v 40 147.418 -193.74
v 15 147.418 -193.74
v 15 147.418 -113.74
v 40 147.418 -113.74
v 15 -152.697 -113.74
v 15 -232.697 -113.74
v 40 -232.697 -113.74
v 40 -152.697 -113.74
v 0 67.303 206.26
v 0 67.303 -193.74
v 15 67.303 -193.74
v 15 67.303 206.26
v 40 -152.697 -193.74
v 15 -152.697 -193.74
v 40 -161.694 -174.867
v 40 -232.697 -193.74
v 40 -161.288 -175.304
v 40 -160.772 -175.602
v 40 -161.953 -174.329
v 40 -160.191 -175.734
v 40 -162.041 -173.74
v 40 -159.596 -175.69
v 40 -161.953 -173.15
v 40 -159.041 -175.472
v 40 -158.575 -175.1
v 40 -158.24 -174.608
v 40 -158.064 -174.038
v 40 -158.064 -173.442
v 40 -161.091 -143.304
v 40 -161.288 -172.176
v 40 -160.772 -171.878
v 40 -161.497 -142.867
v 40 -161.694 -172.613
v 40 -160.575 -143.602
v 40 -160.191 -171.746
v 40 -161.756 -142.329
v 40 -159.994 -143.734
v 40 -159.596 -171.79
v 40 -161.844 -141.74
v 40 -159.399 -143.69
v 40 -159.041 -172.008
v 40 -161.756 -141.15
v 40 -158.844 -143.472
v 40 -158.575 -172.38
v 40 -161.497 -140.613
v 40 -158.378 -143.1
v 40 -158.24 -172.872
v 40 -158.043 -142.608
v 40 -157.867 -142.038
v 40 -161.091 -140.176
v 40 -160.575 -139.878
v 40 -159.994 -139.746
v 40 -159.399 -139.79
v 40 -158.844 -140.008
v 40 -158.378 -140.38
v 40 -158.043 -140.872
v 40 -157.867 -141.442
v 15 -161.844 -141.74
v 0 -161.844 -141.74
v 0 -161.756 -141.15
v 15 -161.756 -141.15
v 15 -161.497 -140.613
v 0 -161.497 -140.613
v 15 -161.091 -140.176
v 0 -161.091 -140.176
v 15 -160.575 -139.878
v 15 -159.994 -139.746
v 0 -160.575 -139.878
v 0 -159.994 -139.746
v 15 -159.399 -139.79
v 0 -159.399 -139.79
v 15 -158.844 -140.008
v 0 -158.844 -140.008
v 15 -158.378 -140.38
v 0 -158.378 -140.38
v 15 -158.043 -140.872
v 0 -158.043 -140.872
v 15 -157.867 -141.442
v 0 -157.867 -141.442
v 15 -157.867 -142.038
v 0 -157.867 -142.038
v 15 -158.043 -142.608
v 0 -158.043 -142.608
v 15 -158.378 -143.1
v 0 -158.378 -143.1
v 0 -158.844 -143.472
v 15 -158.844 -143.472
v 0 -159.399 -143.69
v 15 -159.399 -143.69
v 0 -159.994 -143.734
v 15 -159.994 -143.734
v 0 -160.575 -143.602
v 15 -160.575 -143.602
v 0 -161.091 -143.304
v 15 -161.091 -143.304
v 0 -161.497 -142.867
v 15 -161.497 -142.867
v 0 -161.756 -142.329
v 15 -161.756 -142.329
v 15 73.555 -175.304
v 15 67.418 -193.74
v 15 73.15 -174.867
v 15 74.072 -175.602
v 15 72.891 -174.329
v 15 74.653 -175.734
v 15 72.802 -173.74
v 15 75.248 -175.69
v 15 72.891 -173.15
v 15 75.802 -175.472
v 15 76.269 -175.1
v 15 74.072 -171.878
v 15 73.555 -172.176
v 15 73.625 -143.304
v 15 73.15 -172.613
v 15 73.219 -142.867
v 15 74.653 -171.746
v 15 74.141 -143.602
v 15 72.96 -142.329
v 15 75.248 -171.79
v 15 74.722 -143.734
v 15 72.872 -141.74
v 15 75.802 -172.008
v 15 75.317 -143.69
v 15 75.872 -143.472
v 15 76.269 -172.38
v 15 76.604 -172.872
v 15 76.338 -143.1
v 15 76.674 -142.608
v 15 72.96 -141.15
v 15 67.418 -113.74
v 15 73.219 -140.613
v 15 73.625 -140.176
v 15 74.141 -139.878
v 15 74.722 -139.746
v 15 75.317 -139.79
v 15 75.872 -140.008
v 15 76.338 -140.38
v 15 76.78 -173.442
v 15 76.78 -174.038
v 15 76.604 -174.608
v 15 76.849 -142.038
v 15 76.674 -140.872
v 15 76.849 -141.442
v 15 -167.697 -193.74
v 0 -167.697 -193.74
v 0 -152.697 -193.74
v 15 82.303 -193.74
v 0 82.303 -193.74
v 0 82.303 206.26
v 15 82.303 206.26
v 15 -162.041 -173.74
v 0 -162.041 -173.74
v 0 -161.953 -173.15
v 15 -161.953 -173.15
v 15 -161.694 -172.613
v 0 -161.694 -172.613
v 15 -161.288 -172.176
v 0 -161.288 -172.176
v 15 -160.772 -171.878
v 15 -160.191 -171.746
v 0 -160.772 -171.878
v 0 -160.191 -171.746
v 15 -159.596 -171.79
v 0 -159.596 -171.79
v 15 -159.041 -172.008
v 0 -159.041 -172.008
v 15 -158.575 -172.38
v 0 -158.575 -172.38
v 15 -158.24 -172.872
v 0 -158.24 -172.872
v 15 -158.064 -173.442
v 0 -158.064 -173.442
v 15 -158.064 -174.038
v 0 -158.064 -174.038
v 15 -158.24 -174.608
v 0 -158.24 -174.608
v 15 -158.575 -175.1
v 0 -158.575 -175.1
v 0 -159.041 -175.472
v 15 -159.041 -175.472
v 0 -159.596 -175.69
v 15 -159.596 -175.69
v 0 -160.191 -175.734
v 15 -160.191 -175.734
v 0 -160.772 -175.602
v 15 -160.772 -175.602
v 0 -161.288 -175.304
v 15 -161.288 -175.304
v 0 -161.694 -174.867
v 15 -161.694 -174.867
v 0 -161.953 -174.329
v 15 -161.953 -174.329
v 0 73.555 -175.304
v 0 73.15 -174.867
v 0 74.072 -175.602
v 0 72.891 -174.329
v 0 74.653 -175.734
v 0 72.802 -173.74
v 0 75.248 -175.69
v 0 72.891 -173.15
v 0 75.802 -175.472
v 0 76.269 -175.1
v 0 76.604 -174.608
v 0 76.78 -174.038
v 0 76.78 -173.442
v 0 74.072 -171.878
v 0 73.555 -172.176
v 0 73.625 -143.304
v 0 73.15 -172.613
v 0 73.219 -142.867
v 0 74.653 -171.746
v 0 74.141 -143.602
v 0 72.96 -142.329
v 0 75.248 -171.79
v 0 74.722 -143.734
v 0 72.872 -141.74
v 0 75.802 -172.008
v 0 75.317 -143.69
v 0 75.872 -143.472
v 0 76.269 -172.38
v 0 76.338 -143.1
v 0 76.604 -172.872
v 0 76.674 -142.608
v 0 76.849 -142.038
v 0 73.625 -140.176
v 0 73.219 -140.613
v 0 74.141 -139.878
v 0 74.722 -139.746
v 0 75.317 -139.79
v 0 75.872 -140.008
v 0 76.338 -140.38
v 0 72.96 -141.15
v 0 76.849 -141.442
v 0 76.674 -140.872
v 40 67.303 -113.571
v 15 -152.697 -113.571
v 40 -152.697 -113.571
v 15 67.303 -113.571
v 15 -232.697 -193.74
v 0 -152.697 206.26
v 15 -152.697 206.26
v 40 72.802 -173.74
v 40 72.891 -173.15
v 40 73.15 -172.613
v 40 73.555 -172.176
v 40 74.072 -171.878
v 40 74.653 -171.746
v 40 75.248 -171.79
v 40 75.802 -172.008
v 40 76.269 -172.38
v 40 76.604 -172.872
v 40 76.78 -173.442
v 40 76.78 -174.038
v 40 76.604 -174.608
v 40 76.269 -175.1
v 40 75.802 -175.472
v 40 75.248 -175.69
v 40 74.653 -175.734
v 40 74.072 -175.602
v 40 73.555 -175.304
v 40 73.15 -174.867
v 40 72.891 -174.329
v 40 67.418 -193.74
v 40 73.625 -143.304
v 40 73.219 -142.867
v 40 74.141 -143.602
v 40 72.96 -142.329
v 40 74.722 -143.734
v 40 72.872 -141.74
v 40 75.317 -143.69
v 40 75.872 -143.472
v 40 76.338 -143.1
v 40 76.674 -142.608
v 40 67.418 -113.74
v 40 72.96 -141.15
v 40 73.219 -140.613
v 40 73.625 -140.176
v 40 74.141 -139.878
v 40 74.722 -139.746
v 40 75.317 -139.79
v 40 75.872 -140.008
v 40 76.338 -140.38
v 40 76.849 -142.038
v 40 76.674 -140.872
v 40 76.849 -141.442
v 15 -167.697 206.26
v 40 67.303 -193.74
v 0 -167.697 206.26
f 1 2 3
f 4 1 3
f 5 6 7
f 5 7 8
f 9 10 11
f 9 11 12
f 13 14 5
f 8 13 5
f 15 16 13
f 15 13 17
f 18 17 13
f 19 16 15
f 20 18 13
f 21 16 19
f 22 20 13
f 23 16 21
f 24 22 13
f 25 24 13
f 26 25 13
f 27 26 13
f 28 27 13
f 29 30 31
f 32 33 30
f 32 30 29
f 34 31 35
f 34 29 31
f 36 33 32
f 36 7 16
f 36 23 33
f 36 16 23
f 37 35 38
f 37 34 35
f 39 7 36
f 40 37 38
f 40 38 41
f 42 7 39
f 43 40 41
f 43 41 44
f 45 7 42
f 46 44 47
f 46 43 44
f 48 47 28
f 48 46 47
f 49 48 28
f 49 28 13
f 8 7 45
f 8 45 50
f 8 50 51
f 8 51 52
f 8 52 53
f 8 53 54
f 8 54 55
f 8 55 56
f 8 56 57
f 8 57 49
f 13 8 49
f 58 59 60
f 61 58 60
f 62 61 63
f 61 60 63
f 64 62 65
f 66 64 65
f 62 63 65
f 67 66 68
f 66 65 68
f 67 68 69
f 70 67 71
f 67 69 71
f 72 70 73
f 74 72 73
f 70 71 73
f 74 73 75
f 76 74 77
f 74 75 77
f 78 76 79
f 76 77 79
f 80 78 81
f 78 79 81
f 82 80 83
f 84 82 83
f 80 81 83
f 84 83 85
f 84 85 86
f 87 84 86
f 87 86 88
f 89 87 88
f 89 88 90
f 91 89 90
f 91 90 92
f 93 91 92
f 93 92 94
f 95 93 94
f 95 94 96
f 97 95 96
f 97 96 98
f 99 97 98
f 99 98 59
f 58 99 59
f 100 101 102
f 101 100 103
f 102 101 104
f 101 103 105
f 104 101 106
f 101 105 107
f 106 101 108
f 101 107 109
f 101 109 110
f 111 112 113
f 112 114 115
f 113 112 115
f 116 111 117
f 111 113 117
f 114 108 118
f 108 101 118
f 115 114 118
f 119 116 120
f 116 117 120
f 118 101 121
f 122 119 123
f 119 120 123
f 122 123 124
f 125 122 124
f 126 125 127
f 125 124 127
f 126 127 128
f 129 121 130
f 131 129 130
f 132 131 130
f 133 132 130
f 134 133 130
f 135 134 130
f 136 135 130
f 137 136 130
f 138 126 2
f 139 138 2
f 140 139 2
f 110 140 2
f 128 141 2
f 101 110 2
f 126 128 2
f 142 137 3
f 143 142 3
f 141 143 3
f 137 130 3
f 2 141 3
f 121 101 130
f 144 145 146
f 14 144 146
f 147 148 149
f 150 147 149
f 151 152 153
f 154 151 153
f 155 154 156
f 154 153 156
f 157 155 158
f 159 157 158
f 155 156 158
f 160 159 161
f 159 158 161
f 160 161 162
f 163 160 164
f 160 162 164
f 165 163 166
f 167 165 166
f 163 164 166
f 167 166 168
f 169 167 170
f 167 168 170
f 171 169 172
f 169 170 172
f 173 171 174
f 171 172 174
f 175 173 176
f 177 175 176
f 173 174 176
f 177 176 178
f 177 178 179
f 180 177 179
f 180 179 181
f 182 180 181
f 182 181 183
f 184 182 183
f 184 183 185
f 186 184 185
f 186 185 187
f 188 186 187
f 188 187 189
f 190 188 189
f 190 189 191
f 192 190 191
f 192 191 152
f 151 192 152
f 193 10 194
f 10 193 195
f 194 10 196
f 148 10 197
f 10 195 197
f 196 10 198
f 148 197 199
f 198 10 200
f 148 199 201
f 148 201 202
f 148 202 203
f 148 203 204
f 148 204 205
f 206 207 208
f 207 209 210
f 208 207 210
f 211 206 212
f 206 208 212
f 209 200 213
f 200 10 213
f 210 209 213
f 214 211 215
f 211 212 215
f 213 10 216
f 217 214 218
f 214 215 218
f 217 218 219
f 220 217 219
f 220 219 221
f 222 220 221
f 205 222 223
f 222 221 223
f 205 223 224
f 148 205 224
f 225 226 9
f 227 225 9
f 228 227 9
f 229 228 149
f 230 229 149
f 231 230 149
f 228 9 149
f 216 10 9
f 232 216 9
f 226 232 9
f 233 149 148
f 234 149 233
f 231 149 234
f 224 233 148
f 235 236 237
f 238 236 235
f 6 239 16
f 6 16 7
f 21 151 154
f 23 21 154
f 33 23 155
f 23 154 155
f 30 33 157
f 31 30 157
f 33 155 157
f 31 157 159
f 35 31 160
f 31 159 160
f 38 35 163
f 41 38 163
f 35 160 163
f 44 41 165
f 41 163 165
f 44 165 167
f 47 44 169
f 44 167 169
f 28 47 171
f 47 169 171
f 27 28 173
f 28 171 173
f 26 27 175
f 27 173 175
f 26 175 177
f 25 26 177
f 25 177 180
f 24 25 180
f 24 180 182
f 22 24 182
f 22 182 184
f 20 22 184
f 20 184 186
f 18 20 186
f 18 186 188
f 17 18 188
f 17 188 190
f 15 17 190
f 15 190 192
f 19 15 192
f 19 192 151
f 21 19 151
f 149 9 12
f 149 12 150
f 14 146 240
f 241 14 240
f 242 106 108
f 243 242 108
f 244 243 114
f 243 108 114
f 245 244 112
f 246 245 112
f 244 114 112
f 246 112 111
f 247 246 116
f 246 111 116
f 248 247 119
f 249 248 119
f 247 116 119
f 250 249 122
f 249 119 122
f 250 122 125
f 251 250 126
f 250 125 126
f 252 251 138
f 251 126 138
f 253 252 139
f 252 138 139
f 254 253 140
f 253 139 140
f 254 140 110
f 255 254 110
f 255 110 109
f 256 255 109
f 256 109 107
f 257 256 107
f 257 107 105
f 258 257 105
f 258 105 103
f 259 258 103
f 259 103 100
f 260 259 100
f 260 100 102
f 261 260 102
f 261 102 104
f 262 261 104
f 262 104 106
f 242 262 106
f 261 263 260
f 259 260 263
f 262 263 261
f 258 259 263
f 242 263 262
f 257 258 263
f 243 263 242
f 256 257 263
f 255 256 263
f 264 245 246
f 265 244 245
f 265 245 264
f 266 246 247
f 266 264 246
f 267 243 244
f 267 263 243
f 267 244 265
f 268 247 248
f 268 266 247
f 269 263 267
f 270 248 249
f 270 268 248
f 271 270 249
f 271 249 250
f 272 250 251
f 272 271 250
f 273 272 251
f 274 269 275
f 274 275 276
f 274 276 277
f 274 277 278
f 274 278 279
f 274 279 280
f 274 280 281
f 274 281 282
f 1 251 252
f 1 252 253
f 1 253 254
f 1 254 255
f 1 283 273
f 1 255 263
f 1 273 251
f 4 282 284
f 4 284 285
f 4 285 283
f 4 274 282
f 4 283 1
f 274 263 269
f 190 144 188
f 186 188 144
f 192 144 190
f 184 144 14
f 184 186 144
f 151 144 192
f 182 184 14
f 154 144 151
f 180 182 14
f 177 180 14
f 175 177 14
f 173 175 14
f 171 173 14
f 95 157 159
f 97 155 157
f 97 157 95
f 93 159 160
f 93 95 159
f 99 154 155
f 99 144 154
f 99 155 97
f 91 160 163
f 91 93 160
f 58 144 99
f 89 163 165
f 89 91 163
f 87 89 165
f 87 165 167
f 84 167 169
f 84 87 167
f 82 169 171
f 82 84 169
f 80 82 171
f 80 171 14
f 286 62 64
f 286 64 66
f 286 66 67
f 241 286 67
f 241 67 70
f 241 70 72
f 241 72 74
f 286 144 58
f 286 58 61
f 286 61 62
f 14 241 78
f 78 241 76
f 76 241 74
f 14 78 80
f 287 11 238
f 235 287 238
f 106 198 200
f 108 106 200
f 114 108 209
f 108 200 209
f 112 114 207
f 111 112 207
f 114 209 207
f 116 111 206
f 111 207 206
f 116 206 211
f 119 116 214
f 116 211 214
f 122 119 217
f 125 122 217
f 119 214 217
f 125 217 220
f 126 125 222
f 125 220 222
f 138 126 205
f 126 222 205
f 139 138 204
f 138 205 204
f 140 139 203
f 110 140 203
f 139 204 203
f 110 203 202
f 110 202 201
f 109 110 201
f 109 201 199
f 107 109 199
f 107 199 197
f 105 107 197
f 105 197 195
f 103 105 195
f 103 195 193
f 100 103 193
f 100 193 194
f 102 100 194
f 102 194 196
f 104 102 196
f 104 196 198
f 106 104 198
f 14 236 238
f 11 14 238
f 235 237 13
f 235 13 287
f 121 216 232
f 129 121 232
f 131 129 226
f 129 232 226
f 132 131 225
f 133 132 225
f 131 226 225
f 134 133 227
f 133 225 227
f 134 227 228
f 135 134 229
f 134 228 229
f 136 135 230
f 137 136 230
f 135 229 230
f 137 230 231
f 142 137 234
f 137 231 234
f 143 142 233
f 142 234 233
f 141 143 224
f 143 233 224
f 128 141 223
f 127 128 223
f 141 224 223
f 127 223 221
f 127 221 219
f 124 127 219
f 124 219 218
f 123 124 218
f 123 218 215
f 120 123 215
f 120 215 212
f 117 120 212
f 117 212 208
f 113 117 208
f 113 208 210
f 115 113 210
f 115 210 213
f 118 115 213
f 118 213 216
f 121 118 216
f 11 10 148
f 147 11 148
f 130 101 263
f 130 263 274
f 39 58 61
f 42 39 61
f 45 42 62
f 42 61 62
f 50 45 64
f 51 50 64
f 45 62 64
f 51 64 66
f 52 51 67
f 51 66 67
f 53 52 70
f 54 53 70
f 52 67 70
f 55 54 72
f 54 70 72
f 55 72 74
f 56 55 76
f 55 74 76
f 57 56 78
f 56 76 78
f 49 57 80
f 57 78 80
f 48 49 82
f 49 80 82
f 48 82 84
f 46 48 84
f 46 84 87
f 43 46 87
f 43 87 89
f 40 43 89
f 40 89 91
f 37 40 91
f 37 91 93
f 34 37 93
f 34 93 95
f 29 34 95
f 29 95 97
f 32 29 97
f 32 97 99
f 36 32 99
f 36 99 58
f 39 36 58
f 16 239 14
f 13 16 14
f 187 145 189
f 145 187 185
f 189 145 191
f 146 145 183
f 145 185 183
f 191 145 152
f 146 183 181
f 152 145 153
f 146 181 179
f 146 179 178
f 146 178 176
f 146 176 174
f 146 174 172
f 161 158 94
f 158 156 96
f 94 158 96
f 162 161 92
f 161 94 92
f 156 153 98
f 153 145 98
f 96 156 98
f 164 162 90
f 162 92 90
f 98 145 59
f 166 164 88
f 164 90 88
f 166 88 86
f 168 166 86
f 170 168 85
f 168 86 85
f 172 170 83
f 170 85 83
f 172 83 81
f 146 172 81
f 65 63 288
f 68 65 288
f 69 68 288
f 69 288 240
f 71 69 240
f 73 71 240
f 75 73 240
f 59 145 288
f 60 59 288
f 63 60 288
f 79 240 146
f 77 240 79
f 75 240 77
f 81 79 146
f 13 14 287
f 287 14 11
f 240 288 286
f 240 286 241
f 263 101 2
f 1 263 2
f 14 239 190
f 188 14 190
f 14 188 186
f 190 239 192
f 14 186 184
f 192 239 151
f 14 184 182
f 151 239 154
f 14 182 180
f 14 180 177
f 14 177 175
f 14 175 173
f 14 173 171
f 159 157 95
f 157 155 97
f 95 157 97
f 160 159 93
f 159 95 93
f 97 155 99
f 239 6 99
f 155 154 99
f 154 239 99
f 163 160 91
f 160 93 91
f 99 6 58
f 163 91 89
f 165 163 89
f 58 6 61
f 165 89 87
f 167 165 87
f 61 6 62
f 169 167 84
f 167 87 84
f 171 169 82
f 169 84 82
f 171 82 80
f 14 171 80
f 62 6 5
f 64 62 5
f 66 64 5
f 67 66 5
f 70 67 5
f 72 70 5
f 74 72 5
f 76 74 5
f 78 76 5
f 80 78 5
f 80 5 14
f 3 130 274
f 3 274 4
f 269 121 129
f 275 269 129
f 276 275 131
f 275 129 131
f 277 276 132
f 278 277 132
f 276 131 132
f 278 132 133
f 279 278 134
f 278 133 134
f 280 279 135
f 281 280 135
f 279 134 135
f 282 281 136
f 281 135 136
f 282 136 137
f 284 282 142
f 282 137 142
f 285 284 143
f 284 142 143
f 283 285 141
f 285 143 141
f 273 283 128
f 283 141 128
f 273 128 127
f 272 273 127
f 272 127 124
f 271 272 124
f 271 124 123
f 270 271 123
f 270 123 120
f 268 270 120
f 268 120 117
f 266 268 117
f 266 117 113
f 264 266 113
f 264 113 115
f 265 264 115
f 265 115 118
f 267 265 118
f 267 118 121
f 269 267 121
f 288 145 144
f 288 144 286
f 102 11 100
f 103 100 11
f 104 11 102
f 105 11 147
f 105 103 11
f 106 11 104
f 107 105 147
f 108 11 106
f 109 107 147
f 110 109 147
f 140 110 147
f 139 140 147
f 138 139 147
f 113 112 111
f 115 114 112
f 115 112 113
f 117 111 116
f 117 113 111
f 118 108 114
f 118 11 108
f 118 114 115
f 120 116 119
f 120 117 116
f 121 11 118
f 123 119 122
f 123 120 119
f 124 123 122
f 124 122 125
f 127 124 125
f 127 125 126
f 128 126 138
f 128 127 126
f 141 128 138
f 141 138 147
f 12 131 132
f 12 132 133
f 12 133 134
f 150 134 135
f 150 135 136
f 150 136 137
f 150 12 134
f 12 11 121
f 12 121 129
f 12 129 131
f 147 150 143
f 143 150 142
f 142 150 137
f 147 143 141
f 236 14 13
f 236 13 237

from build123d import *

# Parameters (mm, degrees)
F0_W     = 15
F0_H     = 400
F1_DEPTH = 15
F2_W     = 220
F2_H     = 80.168433
F3_DEPTH = 25
F4_W     = 80
F4_H     = 80
F5_DEPTH = 25
F6_R     = 2
F7_DEPTH = 100


with BuildPart() as f1:
    # F0 (on Right) → F1 (new body)
    with BuildSketch(Plane.YZ):
        with Locations((-160.196858, 6.260082)):
            Rectangle(F0_W, F0_H)
        with Locations((74.803142, 6.260082)):
            Rectangle(F0_W, F0_H)
    extrude(amount=F1_DEPTH)


with BuildPart() as f3:
    # F2 (on face) → F3 (new body)
    with BuildSketch(Plane.YZ.offset(15)):
        with Locations((-42.696858, -153.655701)):
            Rectangle(F2_W, F2_H)
    extrude(amount=F3_DEPTH)


with BuildPart() as f5:
    # F4 (on face) → F5 (new body)
    with BuildSketch(Plane.YZ.offset(15)):
        with Locations((-192.696858, -153.739918)):
            Rectangle(F4_W, F4_H)
        with Locations((107.417637, -153.739918)):
            Rectangle(F4_W, F4_H)
    extrude(amount=F5_DEPTH)


with BuildPart() as f7_tool:
    # F6 (on face) → F7 (new body)
    with BuildSketch(Plane(origin=(0, 0, 0), x_dir=(0, -1, 0), z_dir=(-1, 0, 0))):
        with Locations((-74.871637, -141.739918)):
            Circle(F6_R)
        with Locations((159.844488, -141.739918)):
            Circle(F6_R)
        with Locations((-74.802466, -173.739918)):
            Circle(F6_R)
        with Locations((160.041481, -173.739918)):
            Circle(F6_R)
    extrude(amount=-F7_DEPTH)


with BuildPart() as f1_1:
    add(f1.part)

    # F7: cut by f7_tool
    add(f7_tool.part, mode=Mode.SUBTRACT)


with BuildPart() as f5_1:
    add(f5.part)

    # F7: cut by f7_tool
    add(f7_tool.part, mode=Mode.SUBTRACT)


solid = Compound([f3.part, f1_1.part, f5_1.part])
